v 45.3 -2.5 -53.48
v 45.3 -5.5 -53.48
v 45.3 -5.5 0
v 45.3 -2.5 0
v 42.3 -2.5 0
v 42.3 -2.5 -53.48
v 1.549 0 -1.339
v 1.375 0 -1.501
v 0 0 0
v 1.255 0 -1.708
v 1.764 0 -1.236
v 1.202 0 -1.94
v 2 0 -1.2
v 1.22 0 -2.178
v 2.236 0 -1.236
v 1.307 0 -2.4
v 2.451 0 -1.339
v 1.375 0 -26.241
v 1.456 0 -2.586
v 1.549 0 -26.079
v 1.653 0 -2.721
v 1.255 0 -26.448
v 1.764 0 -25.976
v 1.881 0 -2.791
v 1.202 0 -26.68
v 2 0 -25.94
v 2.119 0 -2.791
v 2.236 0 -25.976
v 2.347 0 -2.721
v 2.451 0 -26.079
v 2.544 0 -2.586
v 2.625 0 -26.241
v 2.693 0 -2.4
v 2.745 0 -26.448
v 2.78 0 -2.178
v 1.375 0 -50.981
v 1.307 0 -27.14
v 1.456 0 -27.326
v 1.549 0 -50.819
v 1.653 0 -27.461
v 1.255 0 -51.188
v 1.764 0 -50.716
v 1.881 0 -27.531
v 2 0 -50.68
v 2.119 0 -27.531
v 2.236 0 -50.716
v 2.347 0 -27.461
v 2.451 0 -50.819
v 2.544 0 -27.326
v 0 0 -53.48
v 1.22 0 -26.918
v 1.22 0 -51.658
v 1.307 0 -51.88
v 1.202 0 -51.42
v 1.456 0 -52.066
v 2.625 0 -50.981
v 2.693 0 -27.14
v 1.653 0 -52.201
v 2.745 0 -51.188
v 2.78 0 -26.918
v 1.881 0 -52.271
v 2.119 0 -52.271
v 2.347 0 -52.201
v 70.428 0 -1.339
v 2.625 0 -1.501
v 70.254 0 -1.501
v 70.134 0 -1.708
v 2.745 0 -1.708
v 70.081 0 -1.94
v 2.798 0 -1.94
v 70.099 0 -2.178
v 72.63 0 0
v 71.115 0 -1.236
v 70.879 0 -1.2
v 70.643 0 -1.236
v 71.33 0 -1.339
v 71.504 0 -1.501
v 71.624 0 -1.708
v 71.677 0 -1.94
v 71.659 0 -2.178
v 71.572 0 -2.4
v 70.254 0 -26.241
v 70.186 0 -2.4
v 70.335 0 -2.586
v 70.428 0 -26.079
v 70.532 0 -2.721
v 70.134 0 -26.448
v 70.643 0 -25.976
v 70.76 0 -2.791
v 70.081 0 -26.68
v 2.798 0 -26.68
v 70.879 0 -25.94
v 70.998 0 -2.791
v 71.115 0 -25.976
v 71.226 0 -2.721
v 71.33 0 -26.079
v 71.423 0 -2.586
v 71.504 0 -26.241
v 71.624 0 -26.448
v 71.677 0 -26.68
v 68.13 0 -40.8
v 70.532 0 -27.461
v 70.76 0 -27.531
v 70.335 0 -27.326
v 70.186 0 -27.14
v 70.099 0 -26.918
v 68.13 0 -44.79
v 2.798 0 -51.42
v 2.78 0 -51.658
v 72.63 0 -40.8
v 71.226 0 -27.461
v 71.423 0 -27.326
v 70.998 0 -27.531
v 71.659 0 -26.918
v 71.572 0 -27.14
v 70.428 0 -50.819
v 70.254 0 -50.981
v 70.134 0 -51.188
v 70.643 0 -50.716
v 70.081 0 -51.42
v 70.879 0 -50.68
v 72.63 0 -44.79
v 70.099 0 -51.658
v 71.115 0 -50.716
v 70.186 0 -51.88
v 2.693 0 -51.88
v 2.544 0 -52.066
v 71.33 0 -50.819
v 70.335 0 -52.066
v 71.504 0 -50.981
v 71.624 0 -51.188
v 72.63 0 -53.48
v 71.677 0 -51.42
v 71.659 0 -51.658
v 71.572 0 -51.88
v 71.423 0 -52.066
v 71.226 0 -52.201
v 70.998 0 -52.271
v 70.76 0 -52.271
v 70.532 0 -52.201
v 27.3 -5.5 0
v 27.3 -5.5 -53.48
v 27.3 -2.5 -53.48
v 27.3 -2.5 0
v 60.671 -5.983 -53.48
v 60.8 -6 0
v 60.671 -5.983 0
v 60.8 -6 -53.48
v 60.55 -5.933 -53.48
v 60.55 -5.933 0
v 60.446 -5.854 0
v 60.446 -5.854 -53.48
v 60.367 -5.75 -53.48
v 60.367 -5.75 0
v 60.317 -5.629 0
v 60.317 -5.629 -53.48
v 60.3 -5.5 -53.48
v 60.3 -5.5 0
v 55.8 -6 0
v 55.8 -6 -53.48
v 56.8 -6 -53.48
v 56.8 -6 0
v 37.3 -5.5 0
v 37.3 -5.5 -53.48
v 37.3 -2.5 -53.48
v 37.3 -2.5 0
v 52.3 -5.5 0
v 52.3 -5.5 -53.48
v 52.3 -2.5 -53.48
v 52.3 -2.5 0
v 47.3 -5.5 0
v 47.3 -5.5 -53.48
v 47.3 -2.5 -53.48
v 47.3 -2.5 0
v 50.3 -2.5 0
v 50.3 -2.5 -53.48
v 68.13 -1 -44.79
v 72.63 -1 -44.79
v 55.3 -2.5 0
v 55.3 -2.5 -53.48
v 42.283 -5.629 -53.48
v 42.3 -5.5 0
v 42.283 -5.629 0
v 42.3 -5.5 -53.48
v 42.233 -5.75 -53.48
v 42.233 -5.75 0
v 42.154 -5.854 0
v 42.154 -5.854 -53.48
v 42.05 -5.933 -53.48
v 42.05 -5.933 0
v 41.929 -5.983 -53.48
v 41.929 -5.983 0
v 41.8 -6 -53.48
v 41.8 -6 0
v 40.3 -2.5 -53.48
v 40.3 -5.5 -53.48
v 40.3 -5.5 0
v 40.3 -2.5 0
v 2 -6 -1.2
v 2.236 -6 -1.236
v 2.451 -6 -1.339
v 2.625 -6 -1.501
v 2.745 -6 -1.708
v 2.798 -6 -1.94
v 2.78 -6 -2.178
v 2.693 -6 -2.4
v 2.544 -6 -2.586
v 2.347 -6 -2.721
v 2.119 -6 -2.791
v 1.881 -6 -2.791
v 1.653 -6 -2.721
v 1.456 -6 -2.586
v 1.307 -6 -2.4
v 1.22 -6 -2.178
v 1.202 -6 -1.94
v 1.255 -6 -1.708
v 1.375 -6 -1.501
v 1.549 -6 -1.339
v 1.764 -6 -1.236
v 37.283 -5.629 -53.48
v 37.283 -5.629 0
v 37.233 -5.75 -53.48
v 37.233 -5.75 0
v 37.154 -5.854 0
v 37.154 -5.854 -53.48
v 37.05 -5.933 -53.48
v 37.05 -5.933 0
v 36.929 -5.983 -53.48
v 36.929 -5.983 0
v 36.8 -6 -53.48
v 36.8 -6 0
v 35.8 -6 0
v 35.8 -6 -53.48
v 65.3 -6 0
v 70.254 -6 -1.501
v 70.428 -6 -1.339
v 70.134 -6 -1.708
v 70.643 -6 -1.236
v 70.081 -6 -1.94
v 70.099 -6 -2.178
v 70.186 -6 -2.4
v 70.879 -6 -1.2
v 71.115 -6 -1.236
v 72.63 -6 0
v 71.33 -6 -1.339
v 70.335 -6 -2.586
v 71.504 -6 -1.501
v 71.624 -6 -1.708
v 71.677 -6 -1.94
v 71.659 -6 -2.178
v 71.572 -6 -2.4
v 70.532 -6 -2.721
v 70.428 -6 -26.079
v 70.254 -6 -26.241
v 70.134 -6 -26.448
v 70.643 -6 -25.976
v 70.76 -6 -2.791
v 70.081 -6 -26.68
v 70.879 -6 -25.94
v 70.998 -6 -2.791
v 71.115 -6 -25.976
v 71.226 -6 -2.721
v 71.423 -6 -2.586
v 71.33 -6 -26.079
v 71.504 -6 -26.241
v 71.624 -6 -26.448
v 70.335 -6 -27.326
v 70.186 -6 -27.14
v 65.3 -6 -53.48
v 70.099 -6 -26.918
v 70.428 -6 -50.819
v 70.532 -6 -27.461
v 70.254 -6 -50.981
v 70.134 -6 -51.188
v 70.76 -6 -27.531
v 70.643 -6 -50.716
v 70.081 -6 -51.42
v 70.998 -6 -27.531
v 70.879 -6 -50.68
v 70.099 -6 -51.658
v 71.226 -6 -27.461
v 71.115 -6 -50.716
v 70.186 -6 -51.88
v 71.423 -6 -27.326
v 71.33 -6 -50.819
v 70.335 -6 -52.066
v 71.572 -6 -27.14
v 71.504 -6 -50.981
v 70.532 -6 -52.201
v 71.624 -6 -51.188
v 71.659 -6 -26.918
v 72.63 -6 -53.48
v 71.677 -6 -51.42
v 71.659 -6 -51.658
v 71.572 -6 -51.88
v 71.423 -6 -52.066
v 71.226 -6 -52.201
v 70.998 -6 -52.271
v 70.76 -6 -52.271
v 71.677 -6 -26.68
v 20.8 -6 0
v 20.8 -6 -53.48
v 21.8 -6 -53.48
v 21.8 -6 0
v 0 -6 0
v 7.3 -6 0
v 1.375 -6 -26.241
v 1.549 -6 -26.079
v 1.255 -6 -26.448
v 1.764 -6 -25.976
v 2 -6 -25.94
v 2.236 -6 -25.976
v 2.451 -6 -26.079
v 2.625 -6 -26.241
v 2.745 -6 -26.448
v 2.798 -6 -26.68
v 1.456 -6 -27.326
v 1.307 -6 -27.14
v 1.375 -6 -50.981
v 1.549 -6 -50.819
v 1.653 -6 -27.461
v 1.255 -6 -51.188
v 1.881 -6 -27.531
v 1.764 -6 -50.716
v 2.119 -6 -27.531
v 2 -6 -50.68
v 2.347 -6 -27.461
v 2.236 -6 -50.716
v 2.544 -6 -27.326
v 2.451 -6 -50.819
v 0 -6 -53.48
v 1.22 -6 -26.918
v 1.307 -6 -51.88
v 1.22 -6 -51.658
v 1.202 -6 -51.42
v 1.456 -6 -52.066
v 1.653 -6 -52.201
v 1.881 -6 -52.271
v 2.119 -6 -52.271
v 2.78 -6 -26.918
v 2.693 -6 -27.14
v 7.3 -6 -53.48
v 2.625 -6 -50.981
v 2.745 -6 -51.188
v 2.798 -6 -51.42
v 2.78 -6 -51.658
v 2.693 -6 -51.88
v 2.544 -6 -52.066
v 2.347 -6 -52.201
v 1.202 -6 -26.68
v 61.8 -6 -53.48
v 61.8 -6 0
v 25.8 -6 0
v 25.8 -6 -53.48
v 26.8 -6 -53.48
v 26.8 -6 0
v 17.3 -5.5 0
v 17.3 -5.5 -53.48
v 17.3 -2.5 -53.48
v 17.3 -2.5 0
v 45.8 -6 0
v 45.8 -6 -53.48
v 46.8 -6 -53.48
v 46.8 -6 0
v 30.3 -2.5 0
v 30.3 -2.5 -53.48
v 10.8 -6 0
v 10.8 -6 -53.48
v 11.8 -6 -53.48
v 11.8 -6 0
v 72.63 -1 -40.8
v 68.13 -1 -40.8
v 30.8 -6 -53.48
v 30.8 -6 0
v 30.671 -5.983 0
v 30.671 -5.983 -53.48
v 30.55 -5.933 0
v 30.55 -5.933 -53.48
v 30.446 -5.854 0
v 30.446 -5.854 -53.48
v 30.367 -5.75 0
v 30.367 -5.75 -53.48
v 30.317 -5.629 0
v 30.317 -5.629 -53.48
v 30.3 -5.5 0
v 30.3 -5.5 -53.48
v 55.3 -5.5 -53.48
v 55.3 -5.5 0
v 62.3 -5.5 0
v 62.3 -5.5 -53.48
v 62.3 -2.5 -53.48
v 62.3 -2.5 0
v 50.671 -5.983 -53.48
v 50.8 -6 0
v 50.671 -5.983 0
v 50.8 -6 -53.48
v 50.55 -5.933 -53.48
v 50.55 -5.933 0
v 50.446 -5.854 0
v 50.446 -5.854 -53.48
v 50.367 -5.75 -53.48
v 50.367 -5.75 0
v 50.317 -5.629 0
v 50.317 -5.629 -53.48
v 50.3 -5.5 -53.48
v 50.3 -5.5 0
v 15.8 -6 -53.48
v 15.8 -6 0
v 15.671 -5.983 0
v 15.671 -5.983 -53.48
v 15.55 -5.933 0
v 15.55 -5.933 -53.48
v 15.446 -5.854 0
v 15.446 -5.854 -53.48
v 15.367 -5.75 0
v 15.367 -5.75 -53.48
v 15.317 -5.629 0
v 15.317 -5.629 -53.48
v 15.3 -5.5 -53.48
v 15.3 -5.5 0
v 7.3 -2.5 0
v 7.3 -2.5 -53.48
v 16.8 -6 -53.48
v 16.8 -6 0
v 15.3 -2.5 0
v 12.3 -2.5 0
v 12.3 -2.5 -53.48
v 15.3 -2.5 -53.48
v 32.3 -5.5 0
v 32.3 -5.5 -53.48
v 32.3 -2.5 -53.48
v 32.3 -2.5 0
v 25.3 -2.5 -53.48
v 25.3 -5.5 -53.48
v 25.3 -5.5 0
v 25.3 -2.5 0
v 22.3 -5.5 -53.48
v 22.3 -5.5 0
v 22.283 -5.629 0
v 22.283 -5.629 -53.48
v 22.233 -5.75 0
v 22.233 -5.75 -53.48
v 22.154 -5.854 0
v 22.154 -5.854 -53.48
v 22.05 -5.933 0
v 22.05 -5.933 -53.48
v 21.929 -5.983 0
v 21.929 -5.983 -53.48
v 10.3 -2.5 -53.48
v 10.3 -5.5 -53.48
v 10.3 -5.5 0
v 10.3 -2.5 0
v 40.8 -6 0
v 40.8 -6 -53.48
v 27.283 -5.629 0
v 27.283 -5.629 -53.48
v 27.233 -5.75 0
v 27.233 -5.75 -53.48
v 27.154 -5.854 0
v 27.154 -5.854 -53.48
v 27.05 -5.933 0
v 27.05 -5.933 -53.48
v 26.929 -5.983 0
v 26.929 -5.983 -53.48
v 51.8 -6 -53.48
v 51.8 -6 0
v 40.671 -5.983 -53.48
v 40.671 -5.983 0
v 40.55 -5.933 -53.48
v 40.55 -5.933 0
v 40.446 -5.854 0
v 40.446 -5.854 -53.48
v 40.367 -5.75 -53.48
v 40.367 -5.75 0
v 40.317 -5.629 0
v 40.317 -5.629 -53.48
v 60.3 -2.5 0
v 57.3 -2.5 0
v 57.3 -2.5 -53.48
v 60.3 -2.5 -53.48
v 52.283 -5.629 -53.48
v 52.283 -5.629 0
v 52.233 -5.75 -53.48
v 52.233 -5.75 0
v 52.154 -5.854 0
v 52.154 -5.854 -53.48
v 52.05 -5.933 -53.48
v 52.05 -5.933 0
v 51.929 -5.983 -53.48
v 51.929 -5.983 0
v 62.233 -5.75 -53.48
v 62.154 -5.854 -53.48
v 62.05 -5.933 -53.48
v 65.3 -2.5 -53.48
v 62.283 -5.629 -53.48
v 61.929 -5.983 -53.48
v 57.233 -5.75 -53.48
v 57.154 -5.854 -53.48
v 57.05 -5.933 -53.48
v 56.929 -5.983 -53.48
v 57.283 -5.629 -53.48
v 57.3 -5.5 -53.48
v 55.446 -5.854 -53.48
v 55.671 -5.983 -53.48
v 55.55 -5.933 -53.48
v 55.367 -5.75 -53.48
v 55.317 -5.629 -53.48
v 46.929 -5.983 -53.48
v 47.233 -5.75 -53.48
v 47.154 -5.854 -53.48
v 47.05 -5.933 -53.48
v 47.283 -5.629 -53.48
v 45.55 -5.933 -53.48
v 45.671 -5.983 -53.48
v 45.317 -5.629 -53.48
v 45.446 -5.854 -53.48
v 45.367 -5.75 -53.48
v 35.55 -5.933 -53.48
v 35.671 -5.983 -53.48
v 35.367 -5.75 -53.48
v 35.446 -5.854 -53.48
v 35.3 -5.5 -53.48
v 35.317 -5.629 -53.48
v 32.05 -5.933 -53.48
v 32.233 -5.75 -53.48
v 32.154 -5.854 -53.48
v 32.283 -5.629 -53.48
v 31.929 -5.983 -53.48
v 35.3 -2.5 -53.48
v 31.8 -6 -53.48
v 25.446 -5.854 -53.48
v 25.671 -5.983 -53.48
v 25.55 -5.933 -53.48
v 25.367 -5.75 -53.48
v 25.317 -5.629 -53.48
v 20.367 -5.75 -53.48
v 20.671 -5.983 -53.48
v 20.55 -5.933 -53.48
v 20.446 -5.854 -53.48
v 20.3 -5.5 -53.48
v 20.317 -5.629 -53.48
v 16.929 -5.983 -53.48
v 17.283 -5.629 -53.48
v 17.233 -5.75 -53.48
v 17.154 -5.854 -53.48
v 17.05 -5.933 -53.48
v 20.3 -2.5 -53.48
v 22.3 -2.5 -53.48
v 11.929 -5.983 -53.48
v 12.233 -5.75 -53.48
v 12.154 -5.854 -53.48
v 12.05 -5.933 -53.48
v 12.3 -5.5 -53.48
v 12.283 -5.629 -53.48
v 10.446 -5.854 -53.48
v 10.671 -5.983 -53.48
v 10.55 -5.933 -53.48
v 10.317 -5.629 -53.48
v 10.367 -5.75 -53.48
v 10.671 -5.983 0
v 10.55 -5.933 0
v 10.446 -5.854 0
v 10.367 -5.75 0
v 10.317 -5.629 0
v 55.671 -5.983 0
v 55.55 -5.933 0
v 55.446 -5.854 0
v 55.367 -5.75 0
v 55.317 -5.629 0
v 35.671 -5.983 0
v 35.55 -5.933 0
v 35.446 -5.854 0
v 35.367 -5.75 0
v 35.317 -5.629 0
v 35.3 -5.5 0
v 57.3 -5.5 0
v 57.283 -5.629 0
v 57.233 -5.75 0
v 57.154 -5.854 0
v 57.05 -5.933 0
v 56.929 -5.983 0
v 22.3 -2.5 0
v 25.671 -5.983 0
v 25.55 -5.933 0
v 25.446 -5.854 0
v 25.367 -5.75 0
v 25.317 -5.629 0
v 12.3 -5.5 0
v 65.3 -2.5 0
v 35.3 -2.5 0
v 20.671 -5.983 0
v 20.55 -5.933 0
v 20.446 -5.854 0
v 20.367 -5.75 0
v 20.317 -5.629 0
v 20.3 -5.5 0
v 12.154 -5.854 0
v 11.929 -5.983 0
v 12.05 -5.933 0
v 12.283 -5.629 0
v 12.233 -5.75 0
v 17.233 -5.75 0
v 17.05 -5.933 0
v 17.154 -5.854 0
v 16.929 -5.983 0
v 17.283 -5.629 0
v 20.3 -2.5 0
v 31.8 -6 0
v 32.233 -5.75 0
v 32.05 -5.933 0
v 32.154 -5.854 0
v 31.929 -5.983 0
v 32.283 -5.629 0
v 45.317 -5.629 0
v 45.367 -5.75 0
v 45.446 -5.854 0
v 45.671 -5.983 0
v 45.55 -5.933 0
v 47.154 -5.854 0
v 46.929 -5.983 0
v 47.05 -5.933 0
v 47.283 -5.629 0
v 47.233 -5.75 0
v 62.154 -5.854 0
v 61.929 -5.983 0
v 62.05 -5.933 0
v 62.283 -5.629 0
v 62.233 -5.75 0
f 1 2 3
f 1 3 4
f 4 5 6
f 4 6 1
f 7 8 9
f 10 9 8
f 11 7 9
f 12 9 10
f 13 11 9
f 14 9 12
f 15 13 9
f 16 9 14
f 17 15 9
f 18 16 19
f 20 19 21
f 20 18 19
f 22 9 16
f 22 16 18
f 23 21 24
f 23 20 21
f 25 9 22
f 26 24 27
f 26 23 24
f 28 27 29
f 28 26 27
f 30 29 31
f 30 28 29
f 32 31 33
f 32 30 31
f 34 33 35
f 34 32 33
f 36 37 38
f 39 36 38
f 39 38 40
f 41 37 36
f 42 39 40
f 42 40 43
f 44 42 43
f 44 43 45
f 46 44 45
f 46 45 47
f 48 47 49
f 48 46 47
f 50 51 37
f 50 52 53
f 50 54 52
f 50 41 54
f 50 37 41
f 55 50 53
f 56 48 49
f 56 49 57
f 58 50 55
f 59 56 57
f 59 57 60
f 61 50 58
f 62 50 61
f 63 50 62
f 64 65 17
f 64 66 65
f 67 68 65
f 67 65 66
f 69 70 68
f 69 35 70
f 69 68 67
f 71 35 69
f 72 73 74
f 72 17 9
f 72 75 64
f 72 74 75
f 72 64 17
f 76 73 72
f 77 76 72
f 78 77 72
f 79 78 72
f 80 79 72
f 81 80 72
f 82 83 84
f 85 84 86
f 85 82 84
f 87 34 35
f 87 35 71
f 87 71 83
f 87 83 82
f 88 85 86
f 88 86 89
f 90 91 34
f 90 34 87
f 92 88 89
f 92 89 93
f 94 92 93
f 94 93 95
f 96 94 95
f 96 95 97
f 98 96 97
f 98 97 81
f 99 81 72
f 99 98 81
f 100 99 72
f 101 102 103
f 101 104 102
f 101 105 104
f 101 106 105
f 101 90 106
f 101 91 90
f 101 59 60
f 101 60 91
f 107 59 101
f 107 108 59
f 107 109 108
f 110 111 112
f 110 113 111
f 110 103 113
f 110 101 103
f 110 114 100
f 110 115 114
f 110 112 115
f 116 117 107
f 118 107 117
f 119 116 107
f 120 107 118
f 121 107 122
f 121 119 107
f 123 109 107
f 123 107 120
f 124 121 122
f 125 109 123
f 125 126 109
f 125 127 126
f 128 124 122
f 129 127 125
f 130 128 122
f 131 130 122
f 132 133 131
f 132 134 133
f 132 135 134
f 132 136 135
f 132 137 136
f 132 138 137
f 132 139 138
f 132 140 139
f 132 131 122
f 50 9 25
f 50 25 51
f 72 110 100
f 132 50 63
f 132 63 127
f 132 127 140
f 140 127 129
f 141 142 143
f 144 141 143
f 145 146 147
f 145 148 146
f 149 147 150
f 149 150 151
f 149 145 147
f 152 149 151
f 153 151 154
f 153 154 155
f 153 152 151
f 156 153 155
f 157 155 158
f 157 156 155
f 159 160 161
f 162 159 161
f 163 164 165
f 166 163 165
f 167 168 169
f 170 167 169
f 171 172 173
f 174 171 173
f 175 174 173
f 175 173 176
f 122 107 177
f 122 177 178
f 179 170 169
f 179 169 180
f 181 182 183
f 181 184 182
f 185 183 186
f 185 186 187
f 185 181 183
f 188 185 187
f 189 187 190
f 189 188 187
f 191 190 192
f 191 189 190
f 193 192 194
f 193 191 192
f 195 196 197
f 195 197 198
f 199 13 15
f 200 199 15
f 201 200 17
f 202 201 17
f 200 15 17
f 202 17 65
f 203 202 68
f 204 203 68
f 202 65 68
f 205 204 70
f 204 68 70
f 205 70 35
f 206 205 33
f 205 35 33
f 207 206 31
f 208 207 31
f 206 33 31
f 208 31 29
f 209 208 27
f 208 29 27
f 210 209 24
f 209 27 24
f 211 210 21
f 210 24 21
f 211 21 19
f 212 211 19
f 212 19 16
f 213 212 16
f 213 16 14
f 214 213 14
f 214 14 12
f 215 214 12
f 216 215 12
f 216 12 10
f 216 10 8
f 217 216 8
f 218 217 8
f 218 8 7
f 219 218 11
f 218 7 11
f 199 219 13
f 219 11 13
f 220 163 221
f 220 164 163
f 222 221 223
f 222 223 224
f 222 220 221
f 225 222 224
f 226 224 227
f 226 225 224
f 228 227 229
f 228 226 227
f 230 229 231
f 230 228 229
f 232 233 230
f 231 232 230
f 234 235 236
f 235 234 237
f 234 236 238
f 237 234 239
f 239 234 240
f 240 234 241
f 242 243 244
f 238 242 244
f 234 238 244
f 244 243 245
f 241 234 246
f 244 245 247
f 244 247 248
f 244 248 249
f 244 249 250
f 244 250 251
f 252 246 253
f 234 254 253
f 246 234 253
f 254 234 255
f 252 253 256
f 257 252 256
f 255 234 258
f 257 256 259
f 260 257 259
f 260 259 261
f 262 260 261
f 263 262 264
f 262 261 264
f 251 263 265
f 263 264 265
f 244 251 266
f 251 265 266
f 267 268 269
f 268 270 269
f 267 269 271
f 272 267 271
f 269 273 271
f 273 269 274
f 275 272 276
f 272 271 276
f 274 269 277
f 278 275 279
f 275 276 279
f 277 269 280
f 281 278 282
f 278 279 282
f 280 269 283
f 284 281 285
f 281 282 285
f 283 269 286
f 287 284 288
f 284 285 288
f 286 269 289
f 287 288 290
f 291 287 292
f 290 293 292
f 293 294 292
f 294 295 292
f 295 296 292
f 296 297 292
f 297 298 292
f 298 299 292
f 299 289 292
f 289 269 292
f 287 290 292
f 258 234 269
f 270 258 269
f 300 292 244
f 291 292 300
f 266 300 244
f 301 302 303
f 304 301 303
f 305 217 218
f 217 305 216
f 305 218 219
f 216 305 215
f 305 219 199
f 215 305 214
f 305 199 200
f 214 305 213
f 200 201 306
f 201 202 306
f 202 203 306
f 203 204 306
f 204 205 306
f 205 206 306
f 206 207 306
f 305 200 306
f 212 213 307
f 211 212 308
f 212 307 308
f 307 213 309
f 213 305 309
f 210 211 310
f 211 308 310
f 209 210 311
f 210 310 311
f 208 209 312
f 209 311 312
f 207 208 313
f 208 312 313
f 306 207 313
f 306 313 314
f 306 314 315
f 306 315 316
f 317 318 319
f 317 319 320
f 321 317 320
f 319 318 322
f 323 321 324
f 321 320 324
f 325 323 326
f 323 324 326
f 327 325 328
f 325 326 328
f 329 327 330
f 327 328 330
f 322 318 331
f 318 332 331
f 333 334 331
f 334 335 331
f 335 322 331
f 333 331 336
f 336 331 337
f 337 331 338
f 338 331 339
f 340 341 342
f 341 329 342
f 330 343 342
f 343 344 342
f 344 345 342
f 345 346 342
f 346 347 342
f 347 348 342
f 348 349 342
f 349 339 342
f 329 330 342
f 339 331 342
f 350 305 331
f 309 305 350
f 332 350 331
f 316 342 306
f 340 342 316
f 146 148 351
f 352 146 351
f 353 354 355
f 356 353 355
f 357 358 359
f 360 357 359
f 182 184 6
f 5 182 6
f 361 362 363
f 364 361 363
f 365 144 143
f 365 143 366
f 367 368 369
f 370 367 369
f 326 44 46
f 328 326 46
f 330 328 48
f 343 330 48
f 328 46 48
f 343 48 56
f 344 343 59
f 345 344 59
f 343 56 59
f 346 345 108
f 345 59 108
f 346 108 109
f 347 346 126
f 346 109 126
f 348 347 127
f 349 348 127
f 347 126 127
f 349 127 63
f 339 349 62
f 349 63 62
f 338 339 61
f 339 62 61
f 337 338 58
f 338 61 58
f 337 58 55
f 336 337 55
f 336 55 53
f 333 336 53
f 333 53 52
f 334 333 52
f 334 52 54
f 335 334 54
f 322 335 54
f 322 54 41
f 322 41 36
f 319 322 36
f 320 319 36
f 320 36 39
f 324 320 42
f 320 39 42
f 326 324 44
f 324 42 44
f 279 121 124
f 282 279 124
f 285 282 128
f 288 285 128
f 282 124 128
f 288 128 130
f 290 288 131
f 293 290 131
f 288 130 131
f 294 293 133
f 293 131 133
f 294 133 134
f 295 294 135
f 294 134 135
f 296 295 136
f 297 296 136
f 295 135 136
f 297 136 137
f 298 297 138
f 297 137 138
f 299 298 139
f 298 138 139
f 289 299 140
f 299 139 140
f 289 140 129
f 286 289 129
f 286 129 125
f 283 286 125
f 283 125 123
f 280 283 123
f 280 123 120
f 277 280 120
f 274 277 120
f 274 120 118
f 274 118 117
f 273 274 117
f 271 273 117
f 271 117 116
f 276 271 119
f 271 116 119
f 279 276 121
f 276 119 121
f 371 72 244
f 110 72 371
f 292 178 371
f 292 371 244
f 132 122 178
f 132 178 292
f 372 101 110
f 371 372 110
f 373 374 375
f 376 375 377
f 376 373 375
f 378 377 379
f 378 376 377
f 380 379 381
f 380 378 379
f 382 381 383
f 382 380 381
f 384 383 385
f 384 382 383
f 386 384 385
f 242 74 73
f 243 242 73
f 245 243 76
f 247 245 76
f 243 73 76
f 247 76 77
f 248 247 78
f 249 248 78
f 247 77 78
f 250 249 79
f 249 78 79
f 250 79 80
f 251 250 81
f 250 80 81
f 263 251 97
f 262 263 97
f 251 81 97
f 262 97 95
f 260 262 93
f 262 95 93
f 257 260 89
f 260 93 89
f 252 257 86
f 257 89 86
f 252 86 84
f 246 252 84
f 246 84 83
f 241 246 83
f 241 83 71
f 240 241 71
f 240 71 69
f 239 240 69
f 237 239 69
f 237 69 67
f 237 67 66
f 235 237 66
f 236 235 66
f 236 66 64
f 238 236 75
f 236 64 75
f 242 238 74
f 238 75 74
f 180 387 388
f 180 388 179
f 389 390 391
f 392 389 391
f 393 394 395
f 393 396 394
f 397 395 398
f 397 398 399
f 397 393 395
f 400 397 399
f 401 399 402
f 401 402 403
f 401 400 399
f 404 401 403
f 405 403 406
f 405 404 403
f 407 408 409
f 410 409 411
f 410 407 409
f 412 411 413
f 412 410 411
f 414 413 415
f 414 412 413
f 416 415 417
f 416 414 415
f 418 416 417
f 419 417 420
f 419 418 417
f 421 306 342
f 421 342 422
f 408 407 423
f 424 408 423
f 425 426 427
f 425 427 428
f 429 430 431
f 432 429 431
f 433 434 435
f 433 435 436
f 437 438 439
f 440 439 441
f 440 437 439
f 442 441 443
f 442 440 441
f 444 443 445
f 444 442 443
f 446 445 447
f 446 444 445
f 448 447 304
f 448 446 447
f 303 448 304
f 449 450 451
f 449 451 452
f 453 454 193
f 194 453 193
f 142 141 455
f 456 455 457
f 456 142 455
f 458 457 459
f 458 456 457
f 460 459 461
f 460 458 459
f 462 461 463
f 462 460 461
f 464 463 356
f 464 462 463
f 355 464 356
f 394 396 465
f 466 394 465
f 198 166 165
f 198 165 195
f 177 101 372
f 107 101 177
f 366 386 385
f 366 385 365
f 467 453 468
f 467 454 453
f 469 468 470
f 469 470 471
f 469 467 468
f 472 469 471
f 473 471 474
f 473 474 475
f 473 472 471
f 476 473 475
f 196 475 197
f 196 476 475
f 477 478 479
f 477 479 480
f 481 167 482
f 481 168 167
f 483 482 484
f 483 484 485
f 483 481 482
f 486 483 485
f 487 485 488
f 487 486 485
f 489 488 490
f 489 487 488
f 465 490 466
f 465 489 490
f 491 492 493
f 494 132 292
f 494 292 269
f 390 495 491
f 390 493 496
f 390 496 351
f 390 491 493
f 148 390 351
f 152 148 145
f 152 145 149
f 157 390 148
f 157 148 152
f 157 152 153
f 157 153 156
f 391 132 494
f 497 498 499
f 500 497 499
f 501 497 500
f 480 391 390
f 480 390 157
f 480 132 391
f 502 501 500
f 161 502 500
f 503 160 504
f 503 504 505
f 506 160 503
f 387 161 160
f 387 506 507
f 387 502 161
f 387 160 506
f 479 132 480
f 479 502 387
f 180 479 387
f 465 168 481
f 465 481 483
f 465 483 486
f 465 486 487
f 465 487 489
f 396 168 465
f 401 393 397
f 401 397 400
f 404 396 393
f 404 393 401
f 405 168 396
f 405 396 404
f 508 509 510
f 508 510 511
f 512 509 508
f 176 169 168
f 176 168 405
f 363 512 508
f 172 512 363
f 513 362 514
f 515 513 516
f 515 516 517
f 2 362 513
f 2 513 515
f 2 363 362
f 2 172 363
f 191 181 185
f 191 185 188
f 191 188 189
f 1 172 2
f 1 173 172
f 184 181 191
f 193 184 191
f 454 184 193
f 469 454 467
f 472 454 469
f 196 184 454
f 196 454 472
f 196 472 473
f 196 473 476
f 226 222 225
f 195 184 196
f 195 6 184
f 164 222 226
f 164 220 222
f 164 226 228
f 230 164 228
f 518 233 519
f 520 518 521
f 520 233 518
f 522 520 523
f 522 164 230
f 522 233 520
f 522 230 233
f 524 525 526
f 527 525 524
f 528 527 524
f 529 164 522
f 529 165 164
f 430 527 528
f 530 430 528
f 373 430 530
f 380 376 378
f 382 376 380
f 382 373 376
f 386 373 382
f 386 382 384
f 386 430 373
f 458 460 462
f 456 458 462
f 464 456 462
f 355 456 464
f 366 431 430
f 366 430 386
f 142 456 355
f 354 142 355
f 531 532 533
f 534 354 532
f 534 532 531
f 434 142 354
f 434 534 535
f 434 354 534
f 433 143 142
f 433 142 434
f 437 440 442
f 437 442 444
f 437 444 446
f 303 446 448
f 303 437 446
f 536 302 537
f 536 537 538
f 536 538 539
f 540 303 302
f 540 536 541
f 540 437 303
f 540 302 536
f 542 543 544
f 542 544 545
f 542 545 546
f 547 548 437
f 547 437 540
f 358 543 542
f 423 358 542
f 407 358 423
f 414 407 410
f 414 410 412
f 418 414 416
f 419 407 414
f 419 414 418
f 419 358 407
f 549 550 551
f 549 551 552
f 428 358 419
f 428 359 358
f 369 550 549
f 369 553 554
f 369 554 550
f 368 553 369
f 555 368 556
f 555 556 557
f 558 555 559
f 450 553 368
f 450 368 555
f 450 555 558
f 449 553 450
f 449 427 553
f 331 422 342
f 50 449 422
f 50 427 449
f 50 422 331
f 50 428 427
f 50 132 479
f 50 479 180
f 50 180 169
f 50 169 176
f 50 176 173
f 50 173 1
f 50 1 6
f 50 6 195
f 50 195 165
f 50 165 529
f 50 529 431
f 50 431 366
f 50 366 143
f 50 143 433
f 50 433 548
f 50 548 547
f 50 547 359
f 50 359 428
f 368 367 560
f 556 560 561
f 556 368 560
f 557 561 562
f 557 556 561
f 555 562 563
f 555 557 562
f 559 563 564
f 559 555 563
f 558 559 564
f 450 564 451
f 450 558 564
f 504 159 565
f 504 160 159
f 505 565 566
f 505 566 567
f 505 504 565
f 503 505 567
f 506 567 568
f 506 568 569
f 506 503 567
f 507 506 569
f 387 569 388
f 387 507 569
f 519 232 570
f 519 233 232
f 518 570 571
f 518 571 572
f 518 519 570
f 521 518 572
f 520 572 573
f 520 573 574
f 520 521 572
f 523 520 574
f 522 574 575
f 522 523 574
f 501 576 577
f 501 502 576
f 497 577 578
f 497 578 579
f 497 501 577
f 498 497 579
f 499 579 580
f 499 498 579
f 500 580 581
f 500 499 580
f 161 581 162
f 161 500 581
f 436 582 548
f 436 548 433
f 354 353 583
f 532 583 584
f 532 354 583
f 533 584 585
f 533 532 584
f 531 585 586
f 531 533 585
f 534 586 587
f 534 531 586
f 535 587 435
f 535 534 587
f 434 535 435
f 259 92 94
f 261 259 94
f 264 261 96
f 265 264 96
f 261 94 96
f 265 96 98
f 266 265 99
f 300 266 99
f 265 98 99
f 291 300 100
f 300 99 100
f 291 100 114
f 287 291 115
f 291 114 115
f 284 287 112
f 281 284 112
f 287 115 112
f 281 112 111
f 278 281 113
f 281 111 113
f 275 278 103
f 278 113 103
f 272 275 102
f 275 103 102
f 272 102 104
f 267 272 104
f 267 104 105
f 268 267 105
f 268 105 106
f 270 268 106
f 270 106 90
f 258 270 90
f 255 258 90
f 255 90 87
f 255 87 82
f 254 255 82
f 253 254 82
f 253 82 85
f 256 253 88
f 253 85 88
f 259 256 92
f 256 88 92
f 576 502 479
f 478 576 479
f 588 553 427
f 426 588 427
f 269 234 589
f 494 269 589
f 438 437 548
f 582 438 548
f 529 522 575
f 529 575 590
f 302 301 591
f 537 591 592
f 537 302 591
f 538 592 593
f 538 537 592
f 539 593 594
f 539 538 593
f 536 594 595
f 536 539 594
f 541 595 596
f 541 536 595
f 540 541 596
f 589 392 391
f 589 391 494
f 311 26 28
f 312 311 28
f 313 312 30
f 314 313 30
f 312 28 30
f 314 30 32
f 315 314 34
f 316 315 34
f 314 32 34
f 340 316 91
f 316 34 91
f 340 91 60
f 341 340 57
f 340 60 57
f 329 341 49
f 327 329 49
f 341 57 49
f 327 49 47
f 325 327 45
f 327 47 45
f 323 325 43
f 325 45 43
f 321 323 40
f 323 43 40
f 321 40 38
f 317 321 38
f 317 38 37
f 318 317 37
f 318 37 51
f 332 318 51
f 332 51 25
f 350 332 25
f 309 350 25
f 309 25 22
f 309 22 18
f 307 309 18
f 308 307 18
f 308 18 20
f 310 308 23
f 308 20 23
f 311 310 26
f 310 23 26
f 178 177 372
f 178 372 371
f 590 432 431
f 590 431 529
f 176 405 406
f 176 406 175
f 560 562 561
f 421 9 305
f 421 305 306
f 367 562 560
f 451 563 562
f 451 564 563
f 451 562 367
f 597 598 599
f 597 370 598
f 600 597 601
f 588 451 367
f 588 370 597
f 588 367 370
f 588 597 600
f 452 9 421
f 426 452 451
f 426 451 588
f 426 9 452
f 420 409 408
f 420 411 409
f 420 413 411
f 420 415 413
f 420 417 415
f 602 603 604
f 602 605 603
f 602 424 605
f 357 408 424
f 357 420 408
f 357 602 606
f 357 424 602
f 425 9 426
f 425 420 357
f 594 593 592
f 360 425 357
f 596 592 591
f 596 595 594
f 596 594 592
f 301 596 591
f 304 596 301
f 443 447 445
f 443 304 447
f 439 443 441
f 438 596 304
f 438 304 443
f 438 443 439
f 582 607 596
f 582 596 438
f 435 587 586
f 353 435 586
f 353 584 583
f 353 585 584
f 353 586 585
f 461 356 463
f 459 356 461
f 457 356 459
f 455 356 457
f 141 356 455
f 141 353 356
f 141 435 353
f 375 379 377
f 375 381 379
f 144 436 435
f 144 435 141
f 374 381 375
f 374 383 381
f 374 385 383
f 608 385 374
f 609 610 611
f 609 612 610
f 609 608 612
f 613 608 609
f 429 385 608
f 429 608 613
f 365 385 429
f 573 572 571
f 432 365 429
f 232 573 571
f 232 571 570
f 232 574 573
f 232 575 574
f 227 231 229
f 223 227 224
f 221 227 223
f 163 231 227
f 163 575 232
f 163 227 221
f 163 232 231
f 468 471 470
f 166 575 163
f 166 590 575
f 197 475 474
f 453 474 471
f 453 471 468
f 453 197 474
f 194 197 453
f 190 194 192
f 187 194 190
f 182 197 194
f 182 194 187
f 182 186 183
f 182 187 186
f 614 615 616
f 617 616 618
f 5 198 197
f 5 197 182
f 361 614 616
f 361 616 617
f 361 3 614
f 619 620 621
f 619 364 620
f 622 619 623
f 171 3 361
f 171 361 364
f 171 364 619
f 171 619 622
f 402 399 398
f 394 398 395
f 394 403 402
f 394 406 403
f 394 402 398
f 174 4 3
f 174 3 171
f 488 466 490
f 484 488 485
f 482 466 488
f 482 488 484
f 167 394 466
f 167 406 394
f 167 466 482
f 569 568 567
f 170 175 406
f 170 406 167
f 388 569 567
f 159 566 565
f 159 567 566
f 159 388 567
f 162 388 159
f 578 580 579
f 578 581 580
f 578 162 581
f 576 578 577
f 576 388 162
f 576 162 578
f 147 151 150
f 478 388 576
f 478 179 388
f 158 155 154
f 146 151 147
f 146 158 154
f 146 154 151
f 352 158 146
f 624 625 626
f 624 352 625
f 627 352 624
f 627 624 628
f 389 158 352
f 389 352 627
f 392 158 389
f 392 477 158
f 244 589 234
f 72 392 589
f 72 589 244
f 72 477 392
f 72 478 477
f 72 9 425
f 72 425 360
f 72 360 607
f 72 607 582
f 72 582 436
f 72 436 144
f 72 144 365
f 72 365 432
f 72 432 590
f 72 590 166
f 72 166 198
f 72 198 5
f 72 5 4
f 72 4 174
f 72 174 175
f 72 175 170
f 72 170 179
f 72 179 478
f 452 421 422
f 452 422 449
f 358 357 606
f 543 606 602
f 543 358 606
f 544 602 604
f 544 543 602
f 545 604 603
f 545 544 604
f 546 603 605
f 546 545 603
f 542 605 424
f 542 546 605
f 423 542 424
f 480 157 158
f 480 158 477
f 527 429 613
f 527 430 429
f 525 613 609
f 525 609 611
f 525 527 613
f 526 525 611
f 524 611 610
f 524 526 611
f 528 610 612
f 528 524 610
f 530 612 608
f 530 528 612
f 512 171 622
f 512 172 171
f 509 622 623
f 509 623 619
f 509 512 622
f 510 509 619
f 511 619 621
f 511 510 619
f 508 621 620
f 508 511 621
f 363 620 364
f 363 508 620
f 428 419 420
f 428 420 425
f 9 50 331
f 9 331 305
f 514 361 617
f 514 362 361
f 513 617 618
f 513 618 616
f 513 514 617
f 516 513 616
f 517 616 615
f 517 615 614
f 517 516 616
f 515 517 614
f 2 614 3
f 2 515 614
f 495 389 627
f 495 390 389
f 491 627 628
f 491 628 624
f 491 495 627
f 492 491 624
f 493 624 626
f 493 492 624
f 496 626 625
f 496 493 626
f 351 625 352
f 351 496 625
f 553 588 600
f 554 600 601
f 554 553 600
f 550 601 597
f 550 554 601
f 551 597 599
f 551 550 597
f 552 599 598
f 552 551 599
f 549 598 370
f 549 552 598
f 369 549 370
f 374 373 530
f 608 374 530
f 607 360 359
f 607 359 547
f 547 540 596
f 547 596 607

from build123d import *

# Parameters (mm, degrees)
EXTRUDE_2_DEPTH     = 6
SKETCH_1_6_W        = 4.5
SKETCH_1_6_H        = 3.99
CUT_EXTRUDE_1_DEPTH = 1
SKETCH_1_7_R        = 0.8
CUT_EXTRUDE_2_DEPTH = 6
SKETCH_1_8_R        = 0.8
CUT_EXTRUDE_3_DEPTH = 6
SKETCH_2_W          = 3
SKETCH_2_H          = 3.5
CUT_EXTRUDE_5_DEPTH = 60
FILLET_1_R          = 0.5


with BuildPart() as part:
    # 草图1 → 凸台-拉伸2 (new body)
    with BuildSketch(Plane(origin=(0, 0, 0), x_dir=(1, 0, 0), z_dir=(0, 1, 0))):
        Polygon((0, 0), (72.63, 0), (72.63, 40.8), (72.63, 44.79), (72.63, 53.48), (0, 53.48), align=None)
    extrude(amount=-EXTRUDE_2_DEPTH)

    # 草图1<6> → 切除-拉伸1 (cut)
    with BuildSketch(Plane(origin=(0, 0, 0), x_dir=(1, 0, 0), z_dir=(0, 1, 0))):
        with Locations((70.38, 42.795)):
            Rectangle(SKETCH_1_6_W, SKETCH_1_6_H)
    extrude(amount=-CUT_EXTRUDE_1_DEPTH, mode=Mode.SUBTRACT)

    # 草图1<7> → 切除-拉伸2 (cut)
    with BuildSketch(Plane(origin=(0, 0, 0), x_dir=(1, 0, 0), z_dir=(0, 1, 0))):
        with Locations((2, 2)):
            Circle(SKETCH_1_7_R)
        with Locations((70.879, 2)):
            Circle(SKETCH_1_7_R)
        with Locations((2, 51.48)):
            Circle(SKETCH_1_7_R)
        with Locations((70.879, 51.48)):
            Circle(SKETCH_1_7_R)
    extrude(amount=-CUT_EXTRUDE_2_DEPTH, mode=Mode.SUBTRACT)

    # 草图1<8> → 切除-拉伸3 (cut)
    with BuildSketch(Plane(origin=(0, 0, 0), x_dir=(1, 0, 0), z_dir=(0, 1, 0))):
        with Locations((2, 26.74)):
            Circle(SKETCH_1_8_R)
        with Locations((70.879, 26.74)):
            Circle(SKETCH_1_8_R)
    extrude(amount=-CUT_EXTRUDE_3_DEPTH, mode=Mode.SUBTRACT)

    # 草图2 → 切除-拉伸5 (cut)
    with BuildSketch(Plane.XY):
        with Locations((63.8, -4.25)):
            Rectangle(SKETCH_2_W, SKETCH_2_H)
        with Locations((58.8, -4.25)):
            Rectangle(SKETCH_2_W, SKETCH_2_H)
        with Locations((53.8, -4.25)):
            Rectangle(SKETCH_2_W, SKETCH_2_H)
        with Locations((48.8, -4.25)):
            Rectangle(SKETCH_2_W, SKETCH_2_H)
        with Locations((43.8, -4.25)):
            Rectangle(SKETCH_2_W, SKETCH_2_H)
        with Locations((38.8, -4.25)):
            Rectangle(SKETCH_2_W, SKETCH_2_H)
        with Locations((33.8, -4.25)):
            Rectangle(SKETCH_2_W, SKETCH_2_H)
        with Locations((28.8, -4.25)):
            Rectangle(SKETCH_2_W, SKETCH_2_H)
        with Locations((23.8, -4.25)):
            Rectangle(SKETCH_2_W, SKETCH_2_H)
        with Locations((18.8, -4.25)):
            Rectangle(SKETCH_2_W, SKETCH_2_H)
        with Locations((13.8, -4.25)):
            Rectangle(SKETCH_2_W, SKETCH_2_H)
        with Locations((8.8, -4.25)):
            Rectangle(SKETCH_2_W, SKETCH_2_H)
    extrude(amount=-CUT_EXTRUDE_5_DEPTH, mode=Mode.SUBTRACT)

    # 圆角1
    fillet_1_edges = [part.edges().sort_by_distance(p)[0] for p in [
        (12.3, -6, -26.74),
        (10.3, -6, -26.74),
        (15.3, -6, -26.74),
        (17.3, -6, -26.74),
        (20.3, -6, -26.74),
        (22.3, -6, -26.74),
        (25.3, -6, -26.74),
        (27.3, -6, -26.74),
        (30.3, -6, -26.74),
        (32.3, -6, -26.74),
        (35.3, -6, -26.74),
        (37.3, -6, -26.74),
        (40.3, -6, -26.74),
        (42.3, -6, -26.74),
        (45.3, -6, -26.74),
        (47.3, -6, -26.74),
        (50.3, -6, -26.74),
        (52.3, -6, -26.74),
        (55.3, -6, -26.74),
        (57.3, -6, -26.74),
        (60.3, -6, -26.74),
        (62.3, -6, -26.74),
    ]]
    fillet(fillet_1_edges, radius=FILLET_1_R)


solid = part.part
